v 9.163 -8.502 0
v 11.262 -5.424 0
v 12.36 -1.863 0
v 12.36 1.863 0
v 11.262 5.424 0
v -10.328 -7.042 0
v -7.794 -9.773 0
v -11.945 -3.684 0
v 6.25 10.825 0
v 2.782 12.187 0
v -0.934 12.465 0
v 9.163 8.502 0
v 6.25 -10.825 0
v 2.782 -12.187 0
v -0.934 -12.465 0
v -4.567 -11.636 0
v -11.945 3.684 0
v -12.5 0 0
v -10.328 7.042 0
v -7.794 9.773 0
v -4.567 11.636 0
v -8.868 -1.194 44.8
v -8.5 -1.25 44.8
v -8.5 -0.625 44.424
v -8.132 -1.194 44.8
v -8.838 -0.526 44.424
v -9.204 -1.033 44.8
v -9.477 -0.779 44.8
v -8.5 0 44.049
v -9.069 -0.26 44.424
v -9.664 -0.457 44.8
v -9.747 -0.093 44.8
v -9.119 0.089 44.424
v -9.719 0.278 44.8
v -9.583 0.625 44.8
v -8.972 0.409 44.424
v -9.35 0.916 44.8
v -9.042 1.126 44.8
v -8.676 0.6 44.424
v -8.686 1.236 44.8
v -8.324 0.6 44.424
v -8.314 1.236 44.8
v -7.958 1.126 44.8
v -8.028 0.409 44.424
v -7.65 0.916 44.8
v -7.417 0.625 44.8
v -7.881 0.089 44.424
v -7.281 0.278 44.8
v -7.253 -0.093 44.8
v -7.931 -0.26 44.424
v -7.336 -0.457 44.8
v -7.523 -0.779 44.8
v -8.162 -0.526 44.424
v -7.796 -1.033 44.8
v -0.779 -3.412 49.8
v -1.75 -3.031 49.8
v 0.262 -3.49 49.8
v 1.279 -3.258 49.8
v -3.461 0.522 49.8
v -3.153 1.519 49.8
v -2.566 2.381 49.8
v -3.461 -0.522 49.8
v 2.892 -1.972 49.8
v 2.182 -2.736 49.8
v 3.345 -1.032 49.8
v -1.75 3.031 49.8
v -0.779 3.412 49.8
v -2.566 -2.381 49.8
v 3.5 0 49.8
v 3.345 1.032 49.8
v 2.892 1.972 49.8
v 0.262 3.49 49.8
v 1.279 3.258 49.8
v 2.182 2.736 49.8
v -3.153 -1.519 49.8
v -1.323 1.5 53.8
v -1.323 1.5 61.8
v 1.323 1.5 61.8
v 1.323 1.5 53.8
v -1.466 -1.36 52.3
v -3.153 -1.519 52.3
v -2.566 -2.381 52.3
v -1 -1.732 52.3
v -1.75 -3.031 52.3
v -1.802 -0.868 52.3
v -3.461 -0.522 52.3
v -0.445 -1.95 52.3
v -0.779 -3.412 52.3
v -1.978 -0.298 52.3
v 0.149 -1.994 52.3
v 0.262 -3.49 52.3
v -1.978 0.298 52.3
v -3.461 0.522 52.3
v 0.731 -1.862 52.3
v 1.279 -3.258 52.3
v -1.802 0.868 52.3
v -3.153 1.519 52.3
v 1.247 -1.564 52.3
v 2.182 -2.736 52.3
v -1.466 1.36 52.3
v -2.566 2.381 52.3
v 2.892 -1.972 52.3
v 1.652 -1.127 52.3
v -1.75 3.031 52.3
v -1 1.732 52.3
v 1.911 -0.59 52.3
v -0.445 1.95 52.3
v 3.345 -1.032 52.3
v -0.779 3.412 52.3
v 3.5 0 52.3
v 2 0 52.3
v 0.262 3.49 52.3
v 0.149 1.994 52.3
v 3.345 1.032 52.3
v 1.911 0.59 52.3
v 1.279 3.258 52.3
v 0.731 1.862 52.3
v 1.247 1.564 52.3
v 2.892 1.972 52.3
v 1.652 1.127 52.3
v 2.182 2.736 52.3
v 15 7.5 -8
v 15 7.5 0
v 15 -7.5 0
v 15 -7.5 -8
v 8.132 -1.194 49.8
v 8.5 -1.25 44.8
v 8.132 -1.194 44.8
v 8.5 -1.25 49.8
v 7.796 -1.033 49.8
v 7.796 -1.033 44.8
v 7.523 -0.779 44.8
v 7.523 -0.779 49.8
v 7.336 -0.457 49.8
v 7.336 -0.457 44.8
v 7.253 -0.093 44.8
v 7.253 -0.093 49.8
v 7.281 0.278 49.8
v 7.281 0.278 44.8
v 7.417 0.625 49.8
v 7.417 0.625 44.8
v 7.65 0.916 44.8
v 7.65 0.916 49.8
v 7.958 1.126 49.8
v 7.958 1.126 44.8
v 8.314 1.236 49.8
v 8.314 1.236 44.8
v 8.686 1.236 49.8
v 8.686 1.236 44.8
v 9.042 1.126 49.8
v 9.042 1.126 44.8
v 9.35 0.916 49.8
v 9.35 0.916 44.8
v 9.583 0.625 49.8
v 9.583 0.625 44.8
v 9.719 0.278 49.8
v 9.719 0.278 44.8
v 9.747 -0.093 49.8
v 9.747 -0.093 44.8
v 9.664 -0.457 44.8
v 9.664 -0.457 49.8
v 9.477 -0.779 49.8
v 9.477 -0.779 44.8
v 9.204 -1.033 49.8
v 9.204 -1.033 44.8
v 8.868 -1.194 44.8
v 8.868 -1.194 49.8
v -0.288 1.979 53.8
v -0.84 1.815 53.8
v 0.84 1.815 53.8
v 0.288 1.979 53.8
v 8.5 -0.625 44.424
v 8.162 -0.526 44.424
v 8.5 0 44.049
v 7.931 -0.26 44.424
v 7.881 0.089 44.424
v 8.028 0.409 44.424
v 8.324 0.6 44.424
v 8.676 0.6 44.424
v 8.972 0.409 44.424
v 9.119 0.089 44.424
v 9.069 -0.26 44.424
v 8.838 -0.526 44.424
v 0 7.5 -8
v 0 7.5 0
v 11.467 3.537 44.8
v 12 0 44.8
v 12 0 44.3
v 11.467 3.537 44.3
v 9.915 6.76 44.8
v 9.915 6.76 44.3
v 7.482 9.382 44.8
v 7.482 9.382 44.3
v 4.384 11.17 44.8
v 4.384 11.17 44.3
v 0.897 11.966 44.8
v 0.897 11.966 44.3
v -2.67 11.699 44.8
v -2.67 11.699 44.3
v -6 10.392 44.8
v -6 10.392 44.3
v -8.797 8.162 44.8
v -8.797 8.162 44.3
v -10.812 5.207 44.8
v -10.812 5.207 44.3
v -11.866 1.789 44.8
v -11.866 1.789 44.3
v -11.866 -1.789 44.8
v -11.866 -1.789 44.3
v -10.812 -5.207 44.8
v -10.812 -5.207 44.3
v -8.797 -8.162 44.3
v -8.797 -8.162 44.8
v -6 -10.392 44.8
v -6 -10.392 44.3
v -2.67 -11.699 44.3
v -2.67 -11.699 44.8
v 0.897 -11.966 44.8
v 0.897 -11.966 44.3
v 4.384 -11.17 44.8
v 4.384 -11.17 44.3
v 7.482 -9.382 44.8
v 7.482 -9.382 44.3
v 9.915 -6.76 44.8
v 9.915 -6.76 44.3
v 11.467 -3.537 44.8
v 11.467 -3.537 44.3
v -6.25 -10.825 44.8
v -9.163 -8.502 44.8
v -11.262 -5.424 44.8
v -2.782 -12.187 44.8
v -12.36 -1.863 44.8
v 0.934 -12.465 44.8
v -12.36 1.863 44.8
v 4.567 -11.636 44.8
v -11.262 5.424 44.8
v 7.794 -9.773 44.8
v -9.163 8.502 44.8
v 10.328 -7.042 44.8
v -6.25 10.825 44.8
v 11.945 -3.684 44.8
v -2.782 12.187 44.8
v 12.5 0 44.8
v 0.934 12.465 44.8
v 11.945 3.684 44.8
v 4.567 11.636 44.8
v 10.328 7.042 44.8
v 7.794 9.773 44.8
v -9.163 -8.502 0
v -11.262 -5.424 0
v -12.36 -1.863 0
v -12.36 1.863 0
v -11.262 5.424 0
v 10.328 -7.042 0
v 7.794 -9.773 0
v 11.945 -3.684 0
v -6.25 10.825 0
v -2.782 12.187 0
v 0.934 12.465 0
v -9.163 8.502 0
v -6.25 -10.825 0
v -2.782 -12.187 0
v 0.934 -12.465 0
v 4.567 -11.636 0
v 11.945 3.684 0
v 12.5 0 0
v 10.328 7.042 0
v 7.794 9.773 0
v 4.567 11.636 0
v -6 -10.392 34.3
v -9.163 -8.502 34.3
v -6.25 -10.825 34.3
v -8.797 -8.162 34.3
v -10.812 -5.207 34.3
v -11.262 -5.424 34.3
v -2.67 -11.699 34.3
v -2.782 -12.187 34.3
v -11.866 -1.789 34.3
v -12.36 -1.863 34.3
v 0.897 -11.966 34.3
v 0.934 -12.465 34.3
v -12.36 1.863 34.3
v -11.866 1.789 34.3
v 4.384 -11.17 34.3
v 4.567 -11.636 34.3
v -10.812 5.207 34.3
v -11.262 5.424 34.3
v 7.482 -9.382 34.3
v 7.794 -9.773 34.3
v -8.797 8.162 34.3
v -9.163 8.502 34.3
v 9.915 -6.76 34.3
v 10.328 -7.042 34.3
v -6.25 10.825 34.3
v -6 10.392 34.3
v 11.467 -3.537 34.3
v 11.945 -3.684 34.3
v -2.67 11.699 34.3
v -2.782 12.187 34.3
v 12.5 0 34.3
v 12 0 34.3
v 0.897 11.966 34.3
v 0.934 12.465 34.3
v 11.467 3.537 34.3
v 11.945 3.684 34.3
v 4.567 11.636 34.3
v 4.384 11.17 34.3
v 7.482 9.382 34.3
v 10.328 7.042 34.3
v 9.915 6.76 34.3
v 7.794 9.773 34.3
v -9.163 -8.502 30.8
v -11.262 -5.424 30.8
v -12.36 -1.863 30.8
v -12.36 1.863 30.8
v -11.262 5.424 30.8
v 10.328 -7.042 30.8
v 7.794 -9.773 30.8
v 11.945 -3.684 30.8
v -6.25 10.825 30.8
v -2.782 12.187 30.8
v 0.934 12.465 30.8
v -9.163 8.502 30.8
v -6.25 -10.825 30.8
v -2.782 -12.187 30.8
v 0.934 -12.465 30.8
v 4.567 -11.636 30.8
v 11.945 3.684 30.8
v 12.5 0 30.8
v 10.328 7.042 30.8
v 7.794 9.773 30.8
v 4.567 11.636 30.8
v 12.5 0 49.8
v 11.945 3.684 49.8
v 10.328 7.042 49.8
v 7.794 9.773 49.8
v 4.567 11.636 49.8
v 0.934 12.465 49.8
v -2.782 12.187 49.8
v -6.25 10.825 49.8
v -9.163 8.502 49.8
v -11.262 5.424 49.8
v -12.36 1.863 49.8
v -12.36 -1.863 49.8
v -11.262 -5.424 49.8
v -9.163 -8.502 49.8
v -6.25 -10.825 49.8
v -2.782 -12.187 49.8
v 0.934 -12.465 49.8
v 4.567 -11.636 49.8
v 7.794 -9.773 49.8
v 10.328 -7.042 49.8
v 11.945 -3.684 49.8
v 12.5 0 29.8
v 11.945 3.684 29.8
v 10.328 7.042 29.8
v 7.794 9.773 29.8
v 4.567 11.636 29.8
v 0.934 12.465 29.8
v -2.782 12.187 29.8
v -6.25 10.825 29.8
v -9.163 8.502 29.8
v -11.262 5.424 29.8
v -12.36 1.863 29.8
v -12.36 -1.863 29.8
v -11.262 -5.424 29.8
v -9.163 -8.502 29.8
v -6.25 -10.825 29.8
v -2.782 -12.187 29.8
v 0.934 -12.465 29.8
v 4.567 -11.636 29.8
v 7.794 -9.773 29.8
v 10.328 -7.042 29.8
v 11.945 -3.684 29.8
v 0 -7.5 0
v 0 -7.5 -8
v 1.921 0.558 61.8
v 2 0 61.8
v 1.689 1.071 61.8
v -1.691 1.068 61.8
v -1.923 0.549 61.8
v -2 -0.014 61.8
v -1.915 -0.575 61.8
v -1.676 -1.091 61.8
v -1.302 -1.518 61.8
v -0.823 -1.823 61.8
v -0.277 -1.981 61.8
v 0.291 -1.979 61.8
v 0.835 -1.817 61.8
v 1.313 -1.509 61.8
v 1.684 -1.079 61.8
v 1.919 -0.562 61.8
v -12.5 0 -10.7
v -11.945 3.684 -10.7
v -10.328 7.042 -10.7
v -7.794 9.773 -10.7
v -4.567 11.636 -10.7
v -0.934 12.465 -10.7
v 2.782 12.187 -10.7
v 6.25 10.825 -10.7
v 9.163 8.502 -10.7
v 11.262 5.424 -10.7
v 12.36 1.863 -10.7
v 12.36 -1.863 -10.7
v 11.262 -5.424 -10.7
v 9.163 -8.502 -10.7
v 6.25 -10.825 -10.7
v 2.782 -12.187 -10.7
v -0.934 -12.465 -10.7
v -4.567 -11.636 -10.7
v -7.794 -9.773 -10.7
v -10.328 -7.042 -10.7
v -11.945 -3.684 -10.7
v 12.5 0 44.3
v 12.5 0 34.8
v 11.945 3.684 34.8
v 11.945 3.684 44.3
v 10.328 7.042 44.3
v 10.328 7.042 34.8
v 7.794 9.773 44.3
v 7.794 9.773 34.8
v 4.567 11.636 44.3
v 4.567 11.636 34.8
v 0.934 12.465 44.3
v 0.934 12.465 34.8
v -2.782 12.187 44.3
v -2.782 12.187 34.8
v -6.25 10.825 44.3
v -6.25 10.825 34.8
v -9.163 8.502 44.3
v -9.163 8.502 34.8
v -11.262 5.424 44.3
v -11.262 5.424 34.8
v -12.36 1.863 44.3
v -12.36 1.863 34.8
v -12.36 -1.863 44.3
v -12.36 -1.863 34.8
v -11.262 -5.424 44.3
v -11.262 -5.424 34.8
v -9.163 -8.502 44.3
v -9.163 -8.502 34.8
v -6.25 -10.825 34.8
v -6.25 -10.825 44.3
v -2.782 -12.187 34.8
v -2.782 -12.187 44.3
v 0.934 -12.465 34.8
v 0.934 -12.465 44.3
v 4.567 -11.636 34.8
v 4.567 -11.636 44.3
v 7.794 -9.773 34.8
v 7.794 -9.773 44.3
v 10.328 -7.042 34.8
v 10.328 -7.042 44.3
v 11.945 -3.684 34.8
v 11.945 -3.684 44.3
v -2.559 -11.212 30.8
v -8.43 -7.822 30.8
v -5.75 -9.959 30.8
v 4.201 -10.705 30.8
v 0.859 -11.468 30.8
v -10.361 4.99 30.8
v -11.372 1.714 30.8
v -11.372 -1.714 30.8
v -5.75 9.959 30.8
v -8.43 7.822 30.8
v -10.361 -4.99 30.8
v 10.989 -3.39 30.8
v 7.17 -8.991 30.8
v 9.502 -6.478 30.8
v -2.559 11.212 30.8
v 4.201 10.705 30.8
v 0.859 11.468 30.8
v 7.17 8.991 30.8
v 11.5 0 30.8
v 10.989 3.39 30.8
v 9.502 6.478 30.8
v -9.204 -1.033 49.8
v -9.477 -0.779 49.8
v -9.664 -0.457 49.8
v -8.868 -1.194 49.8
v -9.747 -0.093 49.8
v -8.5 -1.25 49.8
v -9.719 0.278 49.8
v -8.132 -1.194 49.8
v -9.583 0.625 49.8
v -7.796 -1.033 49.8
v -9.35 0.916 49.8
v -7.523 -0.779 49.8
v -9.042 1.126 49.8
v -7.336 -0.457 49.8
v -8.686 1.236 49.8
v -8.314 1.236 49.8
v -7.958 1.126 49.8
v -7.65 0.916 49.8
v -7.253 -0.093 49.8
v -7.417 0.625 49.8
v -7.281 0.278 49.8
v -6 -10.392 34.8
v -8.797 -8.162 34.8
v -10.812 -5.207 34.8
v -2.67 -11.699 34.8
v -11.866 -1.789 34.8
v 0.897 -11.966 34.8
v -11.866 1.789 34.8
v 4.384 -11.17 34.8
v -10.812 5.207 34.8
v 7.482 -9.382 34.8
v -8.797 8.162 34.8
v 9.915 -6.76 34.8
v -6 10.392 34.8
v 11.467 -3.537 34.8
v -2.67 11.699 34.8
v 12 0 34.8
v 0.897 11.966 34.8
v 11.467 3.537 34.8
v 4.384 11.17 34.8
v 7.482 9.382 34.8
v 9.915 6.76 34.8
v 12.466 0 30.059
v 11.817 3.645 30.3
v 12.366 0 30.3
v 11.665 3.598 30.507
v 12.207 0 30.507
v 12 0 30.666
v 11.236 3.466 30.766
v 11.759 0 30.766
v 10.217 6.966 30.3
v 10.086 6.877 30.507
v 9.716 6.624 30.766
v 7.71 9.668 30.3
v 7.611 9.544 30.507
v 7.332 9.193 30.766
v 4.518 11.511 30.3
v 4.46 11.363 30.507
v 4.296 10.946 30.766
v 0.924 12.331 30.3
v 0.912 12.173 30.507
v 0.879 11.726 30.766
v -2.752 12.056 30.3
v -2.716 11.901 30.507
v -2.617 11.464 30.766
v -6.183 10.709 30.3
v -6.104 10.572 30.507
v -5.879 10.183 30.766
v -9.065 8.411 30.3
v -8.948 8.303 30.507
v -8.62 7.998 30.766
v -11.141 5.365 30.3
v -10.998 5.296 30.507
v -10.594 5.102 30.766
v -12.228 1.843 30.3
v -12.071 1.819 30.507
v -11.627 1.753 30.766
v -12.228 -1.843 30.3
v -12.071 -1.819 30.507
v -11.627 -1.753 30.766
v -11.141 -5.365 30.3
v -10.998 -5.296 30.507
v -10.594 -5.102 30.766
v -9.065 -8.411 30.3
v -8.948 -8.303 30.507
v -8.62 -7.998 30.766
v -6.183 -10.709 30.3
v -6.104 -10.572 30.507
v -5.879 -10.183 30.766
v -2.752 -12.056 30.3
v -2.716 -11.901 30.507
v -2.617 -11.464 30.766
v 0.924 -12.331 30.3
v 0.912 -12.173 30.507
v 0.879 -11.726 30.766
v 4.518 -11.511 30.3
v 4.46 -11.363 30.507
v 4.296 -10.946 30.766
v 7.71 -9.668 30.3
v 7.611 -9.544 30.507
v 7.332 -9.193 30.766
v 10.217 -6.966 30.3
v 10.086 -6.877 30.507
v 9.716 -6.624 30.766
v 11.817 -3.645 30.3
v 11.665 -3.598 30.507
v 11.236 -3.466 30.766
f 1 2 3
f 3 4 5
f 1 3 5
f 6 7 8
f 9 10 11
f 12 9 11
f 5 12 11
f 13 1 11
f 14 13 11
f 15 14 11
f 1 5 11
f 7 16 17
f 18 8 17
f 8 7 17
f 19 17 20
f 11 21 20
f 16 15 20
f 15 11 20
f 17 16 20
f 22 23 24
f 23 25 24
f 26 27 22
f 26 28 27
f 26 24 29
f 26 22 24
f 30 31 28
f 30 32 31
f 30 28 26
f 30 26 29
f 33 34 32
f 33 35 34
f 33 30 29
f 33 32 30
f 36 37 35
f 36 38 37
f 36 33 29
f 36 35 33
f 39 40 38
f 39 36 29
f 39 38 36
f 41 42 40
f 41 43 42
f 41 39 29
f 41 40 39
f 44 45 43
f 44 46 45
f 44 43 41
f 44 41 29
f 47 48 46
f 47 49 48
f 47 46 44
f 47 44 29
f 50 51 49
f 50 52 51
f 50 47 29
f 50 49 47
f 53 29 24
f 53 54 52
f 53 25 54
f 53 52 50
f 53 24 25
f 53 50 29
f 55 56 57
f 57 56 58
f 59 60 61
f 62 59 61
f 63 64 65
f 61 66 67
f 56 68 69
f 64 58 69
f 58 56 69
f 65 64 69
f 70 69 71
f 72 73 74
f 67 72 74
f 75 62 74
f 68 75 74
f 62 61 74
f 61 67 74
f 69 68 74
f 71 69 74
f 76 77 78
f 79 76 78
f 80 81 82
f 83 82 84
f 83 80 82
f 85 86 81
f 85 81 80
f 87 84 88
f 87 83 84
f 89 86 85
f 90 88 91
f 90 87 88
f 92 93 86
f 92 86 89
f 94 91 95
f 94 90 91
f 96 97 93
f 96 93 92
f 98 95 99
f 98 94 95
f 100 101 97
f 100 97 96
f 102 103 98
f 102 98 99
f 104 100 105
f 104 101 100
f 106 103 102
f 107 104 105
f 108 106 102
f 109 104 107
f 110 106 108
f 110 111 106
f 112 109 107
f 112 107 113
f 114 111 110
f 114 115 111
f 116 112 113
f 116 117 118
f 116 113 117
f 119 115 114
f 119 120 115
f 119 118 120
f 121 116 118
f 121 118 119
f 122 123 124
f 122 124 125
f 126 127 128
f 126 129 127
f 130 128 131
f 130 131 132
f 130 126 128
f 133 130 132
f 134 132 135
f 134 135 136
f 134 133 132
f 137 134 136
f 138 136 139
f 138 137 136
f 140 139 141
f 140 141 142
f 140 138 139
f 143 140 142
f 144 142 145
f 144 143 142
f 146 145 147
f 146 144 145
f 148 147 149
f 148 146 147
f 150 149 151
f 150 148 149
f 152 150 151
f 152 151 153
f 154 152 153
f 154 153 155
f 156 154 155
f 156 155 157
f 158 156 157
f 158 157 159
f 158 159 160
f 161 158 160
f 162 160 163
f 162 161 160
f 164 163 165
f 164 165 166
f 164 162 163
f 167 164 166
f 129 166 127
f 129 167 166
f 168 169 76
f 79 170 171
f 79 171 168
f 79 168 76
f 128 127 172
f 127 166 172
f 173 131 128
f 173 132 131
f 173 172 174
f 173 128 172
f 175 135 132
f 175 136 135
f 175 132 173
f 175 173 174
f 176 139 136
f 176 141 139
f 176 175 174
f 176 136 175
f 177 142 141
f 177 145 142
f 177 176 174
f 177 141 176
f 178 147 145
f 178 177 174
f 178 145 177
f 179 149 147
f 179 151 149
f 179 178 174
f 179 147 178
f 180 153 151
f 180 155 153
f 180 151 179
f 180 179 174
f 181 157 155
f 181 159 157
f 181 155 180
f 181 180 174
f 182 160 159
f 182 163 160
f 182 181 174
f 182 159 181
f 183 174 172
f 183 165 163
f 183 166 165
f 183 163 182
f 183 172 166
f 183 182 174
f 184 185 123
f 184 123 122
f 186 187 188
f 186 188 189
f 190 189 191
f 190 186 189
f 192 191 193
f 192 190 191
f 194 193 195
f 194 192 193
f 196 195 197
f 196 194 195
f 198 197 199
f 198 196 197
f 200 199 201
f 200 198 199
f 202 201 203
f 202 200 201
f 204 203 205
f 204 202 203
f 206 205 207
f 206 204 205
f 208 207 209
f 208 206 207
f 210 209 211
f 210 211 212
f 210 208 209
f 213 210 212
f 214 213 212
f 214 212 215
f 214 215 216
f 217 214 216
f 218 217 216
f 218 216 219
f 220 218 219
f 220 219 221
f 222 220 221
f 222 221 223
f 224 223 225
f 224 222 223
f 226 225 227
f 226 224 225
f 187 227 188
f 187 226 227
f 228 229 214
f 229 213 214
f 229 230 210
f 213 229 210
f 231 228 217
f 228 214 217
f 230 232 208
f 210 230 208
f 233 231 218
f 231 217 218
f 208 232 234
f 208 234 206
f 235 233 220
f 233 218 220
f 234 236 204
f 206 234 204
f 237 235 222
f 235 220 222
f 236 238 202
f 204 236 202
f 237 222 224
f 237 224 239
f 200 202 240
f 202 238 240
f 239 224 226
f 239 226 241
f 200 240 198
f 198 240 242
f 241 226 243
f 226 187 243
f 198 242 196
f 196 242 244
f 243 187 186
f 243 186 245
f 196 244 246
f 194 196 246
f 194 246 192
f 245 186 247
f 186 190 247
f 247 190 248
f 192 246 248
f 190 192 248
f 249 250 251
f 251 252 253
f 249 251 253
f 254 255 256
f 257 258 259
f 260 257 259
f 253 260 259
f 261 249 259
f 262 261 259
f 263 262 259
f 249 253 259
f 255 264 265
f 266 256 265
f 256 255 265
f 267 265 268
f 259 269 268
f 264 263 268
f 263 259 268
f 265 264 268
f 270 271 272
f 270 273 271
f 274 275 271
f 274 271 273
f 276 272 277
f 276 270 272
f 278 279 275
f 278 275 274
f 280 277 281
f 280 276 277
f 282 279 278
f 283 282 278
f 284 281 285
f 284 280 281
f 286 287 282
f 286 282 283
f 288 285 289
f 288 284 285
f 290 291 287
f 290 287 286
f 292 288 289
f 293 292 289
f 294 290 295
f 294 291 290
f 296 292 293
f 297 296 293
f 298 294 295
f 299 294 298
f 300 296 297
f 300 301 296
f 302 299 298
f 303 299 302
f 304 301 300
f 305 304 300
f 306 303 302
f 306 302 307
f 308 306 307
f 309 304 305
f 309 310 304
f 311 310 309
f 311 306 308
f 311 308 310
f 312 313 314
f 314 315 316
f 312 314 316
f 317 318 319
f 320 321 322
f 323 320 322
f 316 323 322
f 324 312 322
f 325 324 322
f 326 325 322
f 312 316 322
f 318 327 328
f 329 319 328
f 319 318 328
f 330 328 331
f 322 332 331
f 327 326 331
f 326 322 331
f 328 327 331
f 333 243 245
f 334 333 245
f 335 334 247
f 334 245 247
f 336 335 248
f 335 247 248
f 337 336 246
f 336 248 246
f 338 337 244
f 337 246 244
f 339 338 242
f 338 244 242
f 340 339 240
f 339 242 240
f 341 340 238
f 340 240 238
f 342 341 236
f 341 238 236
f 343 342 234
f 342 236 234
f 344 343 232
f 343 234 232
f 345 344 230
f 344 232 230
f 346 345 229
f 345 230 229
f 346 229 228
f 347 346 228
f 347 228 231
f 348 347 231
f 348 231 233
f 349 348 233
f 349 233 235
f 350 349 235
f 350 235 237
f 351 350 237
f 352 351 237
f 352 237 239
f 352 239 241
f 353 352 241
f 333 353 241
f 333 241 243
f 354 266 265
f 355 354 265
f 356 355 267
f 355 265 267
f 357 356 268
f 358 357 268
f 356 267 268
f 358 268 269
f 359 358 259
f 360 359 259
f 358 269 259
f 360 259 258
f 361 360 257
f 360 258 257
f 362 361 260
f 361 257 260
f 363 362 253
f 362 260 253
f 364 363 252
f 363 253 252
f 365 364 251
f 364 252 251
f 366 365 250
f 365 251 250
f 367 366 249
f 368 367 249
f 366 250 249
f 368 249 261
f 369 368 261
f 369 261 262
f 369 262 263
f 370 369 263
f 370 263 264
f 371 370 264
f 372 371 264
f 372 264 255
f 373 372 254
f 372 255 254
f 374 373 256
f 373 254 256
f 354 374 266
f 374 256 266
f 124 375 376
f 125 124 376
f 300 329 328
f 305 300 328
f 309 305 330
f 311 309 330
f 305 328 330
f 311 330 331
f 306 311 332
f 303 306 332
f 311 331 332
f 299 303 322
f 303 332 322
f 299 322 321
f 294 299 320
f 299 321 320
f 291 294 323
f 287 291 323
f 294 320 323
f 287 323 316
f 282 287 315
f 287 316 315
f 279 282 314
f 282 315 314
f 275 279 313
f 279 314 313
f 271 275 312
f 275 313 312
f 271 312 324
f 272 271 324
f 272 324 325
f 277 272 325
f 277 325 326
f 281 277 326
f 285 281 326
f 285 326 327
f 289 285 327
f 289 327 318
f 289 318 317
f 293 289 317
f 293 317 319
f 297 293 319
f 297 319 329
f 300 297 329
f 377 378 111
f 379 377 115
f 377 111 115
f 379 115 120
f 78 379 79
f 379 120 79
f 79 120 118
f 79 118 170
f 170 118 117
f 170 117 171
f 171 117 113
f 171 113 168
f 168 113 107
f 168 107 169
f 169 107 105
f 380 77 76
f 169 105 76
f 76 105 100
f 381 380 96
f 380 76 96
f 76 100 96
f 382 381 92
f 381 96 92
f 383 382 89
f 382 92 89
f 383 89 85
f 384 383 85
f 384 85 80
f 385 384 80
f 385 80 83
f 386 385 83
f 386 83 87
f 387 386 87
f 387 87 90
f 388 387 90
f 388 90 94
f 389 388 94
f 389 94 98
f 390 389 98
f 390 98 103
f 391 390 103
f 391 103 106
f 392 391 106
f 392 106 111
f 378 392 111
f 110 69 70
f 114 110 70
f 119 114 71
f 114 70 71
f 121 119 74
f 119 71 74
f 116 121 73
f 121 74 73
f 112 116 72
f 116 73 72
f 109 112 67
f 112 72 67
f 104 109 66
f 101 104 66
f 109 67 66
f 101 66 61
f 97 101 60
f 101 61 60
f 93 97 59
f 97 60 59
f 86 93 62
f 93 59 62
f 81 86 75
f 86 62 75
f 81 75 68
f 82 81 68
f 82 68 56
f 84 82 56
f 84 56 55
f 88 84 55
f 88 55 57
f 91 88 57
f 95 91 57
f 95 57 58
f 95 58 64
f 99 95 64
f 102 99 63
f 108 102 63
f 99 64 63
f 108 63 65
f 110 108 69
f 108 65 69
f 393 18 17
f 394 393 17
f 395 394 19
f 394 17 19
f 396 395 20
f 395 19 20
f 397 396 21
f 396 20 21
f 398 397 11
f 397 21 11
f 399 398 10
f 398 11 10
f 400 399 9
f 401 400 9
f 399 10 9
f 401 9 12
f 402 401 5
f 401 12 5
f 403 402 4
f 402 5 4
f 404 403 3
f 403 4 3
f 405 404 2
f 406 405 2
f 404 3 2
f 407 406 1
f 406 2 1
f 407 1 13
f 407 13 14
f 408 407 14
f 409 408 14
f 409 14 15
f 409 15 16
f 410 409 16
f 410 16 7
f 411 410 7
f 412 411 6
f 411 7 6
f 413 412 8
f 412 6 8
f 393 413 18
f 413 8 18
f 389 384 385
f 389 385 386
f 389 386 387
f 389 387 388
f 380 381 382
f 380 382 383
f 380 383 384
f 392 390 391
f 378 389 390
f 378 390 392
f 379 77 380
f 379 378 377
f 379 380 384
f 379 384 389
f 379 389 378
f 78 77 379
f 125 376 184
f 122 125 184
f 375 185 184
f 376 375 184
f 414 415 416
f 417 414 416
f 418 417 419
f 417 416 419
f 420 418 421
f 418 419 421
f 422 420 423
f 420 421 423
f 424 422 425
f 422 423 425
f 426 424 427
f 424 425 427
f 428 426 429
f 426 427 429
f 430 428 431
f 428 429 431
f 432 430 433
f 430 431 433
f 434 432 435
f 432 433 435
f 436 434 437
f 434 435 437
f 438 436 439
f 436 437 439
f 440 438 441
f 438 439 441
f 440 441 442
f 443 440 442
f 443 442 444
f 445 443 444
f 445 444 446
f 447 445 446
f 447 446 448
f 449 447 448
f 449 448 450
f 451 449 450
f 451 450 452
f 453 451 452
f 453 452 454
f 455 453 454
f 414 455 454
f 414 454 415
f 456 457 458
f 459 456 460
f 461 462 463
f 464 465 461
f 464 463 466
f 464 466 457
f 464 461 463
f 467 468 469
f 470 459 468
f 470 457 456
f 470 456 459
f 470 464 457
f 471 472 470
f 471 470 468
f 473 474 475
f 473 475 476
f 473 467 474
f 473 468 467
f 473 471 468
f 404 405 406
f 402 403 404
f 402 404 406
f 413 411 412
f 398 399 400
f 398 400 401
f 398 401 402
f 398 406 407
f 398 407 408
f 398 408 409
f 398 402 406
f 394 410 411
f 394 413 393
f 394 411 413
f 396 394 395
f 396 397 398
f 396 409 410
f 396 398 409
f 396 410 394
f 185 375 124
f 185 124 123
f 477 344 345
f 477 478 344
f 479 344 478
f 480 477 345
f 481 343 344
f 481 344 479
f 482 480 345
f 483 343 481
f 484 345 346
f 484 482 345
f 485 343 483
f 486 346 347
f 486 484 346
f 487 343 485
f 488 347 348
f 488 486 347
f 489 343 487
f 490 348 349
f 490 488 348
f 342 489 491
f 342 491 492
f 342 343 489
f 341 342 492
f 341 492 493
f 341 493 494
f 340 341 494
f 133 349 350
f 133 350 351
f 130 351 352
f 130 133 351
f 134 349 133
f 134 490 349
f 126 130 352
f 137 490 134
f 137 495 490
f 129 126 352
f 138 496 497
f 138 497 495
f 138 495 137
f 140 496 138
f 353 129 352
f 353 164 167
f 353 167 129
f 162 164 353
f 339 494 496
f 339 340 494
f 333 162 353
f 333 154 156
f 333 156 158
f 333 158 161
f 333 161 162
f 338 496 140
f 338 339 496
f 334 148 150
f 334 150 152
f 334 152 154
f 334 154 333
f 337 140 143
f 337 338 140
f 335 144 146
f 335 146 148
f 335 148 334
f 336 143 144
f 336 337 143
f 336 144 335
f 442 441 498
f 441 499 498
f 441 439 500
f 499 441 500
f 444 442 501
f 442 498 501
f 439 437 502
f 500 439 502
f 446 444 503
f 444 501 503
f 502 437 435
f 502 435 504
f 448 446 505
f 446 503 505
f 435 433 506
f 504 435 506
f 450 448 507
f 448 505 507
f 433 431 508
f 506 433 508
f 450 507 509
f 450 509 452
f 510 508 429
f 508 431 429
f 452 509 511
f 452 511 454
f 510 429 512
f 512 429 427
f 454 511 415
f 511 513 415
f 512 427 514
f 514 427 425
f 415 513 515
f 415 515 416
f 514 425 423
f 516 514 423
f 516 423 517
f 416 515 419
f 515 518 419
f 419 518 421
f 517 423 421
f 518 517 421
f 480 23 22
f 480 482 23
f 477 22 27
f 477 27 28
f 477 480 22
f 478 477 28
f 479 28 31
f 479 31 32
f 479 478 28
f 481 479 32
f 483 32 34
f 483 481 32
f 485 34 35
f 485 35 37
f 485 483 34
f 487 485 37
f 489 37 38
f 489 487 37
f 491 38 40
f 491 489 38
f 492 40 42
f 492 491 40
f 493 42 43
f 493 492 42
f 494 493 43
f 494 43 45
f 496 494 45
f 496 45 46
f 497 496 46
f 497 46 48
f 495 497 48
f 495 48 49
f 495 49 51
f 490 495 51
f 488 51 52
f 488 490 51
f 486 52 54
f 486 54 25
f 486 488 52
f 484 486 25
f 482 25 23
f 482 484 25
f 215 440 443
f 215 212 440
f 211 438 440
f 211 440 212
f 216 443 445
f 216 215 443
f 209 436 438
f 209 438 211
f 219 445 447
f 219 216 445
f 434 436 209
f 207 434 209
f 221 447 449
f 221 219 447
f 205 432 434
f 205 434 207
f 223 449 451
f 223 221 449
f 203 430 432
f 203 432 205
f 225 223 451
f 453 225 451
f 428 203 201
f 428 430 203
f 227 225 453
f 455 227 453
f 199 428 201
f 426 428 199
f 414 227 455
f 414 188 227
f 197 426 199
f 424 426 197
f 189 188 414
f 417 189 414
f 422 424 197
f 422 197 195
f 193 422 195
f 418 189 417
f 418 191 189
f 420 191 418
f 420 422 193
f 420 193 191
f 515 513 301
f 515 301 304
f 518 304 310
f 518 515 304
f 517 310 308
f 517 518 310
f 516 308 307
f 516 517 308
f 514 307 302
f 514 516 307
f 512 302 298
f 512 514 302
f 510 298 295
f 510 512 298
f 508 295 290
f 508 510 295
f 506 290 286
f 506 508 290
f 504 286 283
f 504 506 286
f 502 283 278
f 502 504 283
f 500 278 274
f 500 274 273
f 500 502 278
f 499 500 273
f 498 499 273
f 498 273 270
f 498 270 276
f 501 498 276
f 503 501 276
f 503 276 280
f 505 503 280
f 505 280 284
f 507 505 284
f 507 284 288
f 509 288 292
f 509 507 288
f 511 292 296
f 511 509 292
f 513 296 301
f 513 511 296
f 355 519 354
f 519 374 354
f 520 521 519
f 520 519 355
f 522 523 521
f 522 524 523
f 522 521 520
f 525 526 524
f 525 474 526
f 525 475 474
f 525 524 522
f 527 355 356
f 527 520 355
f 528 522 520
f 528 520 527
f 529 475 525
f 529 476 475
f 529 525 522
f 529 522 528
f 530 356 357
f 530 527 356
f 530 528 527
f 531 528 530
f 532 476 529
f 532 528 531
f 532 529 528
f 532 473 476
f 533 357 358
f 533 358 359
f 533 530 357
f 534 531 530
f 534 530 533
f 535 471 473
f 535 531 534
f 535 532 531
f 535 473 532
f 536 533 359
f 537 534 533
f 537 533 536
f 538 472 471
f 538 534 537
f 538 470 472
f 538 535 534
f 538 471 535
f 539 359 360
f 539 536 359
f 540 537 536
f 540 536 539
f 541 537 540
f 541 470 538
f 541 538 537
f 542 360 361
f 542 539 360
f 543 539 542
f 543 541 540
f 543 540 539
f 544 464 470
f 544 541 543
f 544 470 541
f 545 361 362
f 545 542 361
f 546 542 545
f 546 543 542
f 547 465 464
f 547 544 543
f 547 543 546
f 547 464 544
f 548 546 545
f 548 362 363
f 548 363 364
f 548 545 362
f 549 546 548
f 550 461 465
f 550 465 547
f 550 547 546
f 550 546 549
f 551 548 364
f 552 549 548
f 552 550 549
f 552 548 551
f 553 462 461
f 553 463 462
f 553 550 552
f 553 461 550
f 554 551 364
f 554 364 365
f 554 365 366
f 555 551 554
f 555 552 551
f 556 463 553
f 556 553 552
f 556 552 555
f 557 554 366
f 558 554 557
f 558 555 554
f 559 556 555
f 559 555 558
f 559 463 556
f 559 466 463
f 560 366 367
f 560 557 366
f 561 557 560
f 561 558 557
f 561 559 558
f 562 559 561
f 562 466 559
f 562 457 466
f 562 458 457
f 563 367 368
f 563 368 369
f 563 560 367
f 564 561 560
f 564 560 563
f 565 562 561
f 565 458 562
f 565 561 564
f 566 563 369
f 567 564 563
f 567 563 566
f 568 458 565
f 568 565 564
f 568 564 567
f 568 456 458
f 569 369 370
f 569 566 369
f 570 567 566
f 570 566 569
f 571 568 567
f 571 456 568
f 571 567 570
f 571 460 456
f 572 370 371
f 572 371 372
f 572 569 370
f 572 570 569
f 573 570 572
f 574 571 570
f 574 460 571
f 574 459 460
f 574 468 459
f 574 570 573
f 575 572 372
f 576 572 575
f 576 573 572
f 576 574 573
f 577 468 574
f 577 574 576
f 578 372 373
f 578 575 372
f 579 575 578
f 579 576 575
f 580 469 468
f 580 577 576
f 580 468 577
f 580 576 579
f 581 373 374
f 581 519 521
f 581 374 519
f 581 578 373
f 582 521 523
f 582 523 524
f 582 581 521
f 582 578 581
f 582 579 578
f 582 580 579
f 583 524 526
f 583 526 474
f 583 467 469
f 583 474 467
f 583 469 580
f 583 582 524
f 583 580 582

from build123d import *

# Parameters (mm, degrees)
SKETCH_1_R             = 12.5
EXTRUDE_1_DEPTH        = 30.8
SKETCH_2_R             = 12.5
EXTRUDE_2_DEPTH        = 10.7
SKETCH_3_W             = 8
SKETCH_3_H             = 15
EXTRUDE_3_DEPTH        = 15
FILLET_1_R             = 1
SKETCH_4_R             = 12.5
EXTRUDE_4_DEPTH        = 19
CUT_EXTRUDE_START      = -15
SKETCH_5_R             = 12.5
SKETCH_5_R_2           = 12
CUT_EXTRUDE_1_DEPTH    = 0.5
PATTERN_LINEAR_1_COUNT = 2
PATTERN_LINEAR_1_PITCH = 10
SKETCH_6_R             = 3.5
EXTRUDE_5_DEPTH        = 2.5
SKETCH_7_R             = 2
EXTRUDE_6_DEPTH        = 9.5
CUT_EXTRUDE_2_DEPTH    = 8
M3X0_5_1_AT_2_COUNT    = 2
M3X0_5_1_AT_2_PITCH    = 17


with BuildPart() as part:
    # 草圖1 → 填料-伸長1 (new body)
    with BuildSketch(Plane.XY):
        Circle(SKETCH_1_R)
    extrude(amount=EXTRUDE_1_DEPTH)

    # 圓角1
    fillet_1_edges = [part.edges().sort_by_distance(p)[0] for p in [
        (-12.5, 0, 30.8),
    ]]
    fillet(fillet_1_edges, radius=FILLET_1_R)


with BuildPart() as body_2:
    # 草圖2 → 填料-伸長2 (new body)
    with BuildSketch(Plane(origin=(0, 0, 0), x_dir=(-1, 0, 0), z_dir=(0, 0, -1))):
        Circle(SKETCH_2_R)
    extrude(amount=EXTRUDE_2_DEPTH)


with BuildPart() as body_3:
    # 草圖3 → 填料-伸長3 (new body)
    with BuildSketch(Plane(origin=(0, 0, 0), x_dir=(0, 0, -1), z_dir=(1, 0, 0))):
        with Locations((4, 0)):
            Rectangle(SKETCH_3_W, SKETCH_3_H)
    extrude(amount=EXTRUDE_3_DEPTH)


with BuildPart() as body_4:
    # 草圖4 → 填料-伸長4 (new body)
    with BuildSketch(Plane.XY.offset(30.8)):
        Circle(SKETCH_4_R)
    extrude(amount=EXTRUDE_4_DEPTH)

    # 草圖5 → 除料-伸長1 (cut)
    with BuildSketch(Plane.XY.offset(49.8).offset(CUT_EXTRUDE_START)):
        Circle(SKETCH_5_R)
        Circle(SKETCH_5_R_2, mode=Mode.SUBTRACT)
    cut_extrude_1 = extrude(amount=-CUT_EXTRUDE_1_DEPTH, mode=Mode.SUBTRACT)

    # 直線複製排列1: 除料-伸長1 ×2
    with Locations(*[(0, 0, i * PATTERN_LINEAR_1_PITCH) for i in range(1, PATTERN_LINEAR_1_COUNT)]):
        add(cut_extrude_1, mode=Mode.SUBTRACT)

    # 草圖12 → M3x0.5 螺紋孔1 (revolve, cut)
    with BuildSketch(Plane(origin=(8.5, 0, 49.8), x_dir=(0, -1, 0), z_dir=(1, 0, 0))):
        Polygon((0, 0), (0, 5.751075774), (1.25, 5), (1.25, 0), align=None)
    m3x0_5_1 = revolve(axis=Axis((8.5, 0, 56.15), (0, 0, -1)), mode=Mode.SUBTRACT)

    # M3x0.5 螺紋孔1 at 2: M3x0.5 螺紋孔1 ×2
    with Locations(*[(-i * M3X0_5_1_AT_2_PITCH, 0, 0) for i in range(1, M3X0_5_1_AT_2_COUNT)]):
        add(m3x0_5_1, mode=Mode.SUBTRACT)


with BuildPart() as body_5:
    # 草圖6 → 填料-伸長5 (new body)
    with BuildSketch(Plane.XY.offset(49.8)):
        Circle(SKETCH_6_R)
    extrude(amount=EXTRUDE_5_DEPTH)

    # 草圖7 → 填料-伸長6 (add)
    with BuildSketch(Plane.XY.offset(52.3)):
        Circle(SKETCH_7_R)
    extrude(amount=EXTRUDE_6_DEPTH)

    # 草圖8 → 除料-伸長2 (cut)
    with BuildSketch(Plane.XY.offset(61.8)):
        with BuildLine():
            Line((-1.322875656, 1.5), (1.322875656, 1.5))
            ThreePointArc((1.322875656, 1.5), (0, 2), (-1.322875656, 1.5))
        make_face()
    extrude(amount=-CUT_EXTRUDE_2_DEPTH, mode=Mode.SUBTRACT)


solid = Compound([part.part, body_2.part, body_3.part, body_4.part, body_5.part])
